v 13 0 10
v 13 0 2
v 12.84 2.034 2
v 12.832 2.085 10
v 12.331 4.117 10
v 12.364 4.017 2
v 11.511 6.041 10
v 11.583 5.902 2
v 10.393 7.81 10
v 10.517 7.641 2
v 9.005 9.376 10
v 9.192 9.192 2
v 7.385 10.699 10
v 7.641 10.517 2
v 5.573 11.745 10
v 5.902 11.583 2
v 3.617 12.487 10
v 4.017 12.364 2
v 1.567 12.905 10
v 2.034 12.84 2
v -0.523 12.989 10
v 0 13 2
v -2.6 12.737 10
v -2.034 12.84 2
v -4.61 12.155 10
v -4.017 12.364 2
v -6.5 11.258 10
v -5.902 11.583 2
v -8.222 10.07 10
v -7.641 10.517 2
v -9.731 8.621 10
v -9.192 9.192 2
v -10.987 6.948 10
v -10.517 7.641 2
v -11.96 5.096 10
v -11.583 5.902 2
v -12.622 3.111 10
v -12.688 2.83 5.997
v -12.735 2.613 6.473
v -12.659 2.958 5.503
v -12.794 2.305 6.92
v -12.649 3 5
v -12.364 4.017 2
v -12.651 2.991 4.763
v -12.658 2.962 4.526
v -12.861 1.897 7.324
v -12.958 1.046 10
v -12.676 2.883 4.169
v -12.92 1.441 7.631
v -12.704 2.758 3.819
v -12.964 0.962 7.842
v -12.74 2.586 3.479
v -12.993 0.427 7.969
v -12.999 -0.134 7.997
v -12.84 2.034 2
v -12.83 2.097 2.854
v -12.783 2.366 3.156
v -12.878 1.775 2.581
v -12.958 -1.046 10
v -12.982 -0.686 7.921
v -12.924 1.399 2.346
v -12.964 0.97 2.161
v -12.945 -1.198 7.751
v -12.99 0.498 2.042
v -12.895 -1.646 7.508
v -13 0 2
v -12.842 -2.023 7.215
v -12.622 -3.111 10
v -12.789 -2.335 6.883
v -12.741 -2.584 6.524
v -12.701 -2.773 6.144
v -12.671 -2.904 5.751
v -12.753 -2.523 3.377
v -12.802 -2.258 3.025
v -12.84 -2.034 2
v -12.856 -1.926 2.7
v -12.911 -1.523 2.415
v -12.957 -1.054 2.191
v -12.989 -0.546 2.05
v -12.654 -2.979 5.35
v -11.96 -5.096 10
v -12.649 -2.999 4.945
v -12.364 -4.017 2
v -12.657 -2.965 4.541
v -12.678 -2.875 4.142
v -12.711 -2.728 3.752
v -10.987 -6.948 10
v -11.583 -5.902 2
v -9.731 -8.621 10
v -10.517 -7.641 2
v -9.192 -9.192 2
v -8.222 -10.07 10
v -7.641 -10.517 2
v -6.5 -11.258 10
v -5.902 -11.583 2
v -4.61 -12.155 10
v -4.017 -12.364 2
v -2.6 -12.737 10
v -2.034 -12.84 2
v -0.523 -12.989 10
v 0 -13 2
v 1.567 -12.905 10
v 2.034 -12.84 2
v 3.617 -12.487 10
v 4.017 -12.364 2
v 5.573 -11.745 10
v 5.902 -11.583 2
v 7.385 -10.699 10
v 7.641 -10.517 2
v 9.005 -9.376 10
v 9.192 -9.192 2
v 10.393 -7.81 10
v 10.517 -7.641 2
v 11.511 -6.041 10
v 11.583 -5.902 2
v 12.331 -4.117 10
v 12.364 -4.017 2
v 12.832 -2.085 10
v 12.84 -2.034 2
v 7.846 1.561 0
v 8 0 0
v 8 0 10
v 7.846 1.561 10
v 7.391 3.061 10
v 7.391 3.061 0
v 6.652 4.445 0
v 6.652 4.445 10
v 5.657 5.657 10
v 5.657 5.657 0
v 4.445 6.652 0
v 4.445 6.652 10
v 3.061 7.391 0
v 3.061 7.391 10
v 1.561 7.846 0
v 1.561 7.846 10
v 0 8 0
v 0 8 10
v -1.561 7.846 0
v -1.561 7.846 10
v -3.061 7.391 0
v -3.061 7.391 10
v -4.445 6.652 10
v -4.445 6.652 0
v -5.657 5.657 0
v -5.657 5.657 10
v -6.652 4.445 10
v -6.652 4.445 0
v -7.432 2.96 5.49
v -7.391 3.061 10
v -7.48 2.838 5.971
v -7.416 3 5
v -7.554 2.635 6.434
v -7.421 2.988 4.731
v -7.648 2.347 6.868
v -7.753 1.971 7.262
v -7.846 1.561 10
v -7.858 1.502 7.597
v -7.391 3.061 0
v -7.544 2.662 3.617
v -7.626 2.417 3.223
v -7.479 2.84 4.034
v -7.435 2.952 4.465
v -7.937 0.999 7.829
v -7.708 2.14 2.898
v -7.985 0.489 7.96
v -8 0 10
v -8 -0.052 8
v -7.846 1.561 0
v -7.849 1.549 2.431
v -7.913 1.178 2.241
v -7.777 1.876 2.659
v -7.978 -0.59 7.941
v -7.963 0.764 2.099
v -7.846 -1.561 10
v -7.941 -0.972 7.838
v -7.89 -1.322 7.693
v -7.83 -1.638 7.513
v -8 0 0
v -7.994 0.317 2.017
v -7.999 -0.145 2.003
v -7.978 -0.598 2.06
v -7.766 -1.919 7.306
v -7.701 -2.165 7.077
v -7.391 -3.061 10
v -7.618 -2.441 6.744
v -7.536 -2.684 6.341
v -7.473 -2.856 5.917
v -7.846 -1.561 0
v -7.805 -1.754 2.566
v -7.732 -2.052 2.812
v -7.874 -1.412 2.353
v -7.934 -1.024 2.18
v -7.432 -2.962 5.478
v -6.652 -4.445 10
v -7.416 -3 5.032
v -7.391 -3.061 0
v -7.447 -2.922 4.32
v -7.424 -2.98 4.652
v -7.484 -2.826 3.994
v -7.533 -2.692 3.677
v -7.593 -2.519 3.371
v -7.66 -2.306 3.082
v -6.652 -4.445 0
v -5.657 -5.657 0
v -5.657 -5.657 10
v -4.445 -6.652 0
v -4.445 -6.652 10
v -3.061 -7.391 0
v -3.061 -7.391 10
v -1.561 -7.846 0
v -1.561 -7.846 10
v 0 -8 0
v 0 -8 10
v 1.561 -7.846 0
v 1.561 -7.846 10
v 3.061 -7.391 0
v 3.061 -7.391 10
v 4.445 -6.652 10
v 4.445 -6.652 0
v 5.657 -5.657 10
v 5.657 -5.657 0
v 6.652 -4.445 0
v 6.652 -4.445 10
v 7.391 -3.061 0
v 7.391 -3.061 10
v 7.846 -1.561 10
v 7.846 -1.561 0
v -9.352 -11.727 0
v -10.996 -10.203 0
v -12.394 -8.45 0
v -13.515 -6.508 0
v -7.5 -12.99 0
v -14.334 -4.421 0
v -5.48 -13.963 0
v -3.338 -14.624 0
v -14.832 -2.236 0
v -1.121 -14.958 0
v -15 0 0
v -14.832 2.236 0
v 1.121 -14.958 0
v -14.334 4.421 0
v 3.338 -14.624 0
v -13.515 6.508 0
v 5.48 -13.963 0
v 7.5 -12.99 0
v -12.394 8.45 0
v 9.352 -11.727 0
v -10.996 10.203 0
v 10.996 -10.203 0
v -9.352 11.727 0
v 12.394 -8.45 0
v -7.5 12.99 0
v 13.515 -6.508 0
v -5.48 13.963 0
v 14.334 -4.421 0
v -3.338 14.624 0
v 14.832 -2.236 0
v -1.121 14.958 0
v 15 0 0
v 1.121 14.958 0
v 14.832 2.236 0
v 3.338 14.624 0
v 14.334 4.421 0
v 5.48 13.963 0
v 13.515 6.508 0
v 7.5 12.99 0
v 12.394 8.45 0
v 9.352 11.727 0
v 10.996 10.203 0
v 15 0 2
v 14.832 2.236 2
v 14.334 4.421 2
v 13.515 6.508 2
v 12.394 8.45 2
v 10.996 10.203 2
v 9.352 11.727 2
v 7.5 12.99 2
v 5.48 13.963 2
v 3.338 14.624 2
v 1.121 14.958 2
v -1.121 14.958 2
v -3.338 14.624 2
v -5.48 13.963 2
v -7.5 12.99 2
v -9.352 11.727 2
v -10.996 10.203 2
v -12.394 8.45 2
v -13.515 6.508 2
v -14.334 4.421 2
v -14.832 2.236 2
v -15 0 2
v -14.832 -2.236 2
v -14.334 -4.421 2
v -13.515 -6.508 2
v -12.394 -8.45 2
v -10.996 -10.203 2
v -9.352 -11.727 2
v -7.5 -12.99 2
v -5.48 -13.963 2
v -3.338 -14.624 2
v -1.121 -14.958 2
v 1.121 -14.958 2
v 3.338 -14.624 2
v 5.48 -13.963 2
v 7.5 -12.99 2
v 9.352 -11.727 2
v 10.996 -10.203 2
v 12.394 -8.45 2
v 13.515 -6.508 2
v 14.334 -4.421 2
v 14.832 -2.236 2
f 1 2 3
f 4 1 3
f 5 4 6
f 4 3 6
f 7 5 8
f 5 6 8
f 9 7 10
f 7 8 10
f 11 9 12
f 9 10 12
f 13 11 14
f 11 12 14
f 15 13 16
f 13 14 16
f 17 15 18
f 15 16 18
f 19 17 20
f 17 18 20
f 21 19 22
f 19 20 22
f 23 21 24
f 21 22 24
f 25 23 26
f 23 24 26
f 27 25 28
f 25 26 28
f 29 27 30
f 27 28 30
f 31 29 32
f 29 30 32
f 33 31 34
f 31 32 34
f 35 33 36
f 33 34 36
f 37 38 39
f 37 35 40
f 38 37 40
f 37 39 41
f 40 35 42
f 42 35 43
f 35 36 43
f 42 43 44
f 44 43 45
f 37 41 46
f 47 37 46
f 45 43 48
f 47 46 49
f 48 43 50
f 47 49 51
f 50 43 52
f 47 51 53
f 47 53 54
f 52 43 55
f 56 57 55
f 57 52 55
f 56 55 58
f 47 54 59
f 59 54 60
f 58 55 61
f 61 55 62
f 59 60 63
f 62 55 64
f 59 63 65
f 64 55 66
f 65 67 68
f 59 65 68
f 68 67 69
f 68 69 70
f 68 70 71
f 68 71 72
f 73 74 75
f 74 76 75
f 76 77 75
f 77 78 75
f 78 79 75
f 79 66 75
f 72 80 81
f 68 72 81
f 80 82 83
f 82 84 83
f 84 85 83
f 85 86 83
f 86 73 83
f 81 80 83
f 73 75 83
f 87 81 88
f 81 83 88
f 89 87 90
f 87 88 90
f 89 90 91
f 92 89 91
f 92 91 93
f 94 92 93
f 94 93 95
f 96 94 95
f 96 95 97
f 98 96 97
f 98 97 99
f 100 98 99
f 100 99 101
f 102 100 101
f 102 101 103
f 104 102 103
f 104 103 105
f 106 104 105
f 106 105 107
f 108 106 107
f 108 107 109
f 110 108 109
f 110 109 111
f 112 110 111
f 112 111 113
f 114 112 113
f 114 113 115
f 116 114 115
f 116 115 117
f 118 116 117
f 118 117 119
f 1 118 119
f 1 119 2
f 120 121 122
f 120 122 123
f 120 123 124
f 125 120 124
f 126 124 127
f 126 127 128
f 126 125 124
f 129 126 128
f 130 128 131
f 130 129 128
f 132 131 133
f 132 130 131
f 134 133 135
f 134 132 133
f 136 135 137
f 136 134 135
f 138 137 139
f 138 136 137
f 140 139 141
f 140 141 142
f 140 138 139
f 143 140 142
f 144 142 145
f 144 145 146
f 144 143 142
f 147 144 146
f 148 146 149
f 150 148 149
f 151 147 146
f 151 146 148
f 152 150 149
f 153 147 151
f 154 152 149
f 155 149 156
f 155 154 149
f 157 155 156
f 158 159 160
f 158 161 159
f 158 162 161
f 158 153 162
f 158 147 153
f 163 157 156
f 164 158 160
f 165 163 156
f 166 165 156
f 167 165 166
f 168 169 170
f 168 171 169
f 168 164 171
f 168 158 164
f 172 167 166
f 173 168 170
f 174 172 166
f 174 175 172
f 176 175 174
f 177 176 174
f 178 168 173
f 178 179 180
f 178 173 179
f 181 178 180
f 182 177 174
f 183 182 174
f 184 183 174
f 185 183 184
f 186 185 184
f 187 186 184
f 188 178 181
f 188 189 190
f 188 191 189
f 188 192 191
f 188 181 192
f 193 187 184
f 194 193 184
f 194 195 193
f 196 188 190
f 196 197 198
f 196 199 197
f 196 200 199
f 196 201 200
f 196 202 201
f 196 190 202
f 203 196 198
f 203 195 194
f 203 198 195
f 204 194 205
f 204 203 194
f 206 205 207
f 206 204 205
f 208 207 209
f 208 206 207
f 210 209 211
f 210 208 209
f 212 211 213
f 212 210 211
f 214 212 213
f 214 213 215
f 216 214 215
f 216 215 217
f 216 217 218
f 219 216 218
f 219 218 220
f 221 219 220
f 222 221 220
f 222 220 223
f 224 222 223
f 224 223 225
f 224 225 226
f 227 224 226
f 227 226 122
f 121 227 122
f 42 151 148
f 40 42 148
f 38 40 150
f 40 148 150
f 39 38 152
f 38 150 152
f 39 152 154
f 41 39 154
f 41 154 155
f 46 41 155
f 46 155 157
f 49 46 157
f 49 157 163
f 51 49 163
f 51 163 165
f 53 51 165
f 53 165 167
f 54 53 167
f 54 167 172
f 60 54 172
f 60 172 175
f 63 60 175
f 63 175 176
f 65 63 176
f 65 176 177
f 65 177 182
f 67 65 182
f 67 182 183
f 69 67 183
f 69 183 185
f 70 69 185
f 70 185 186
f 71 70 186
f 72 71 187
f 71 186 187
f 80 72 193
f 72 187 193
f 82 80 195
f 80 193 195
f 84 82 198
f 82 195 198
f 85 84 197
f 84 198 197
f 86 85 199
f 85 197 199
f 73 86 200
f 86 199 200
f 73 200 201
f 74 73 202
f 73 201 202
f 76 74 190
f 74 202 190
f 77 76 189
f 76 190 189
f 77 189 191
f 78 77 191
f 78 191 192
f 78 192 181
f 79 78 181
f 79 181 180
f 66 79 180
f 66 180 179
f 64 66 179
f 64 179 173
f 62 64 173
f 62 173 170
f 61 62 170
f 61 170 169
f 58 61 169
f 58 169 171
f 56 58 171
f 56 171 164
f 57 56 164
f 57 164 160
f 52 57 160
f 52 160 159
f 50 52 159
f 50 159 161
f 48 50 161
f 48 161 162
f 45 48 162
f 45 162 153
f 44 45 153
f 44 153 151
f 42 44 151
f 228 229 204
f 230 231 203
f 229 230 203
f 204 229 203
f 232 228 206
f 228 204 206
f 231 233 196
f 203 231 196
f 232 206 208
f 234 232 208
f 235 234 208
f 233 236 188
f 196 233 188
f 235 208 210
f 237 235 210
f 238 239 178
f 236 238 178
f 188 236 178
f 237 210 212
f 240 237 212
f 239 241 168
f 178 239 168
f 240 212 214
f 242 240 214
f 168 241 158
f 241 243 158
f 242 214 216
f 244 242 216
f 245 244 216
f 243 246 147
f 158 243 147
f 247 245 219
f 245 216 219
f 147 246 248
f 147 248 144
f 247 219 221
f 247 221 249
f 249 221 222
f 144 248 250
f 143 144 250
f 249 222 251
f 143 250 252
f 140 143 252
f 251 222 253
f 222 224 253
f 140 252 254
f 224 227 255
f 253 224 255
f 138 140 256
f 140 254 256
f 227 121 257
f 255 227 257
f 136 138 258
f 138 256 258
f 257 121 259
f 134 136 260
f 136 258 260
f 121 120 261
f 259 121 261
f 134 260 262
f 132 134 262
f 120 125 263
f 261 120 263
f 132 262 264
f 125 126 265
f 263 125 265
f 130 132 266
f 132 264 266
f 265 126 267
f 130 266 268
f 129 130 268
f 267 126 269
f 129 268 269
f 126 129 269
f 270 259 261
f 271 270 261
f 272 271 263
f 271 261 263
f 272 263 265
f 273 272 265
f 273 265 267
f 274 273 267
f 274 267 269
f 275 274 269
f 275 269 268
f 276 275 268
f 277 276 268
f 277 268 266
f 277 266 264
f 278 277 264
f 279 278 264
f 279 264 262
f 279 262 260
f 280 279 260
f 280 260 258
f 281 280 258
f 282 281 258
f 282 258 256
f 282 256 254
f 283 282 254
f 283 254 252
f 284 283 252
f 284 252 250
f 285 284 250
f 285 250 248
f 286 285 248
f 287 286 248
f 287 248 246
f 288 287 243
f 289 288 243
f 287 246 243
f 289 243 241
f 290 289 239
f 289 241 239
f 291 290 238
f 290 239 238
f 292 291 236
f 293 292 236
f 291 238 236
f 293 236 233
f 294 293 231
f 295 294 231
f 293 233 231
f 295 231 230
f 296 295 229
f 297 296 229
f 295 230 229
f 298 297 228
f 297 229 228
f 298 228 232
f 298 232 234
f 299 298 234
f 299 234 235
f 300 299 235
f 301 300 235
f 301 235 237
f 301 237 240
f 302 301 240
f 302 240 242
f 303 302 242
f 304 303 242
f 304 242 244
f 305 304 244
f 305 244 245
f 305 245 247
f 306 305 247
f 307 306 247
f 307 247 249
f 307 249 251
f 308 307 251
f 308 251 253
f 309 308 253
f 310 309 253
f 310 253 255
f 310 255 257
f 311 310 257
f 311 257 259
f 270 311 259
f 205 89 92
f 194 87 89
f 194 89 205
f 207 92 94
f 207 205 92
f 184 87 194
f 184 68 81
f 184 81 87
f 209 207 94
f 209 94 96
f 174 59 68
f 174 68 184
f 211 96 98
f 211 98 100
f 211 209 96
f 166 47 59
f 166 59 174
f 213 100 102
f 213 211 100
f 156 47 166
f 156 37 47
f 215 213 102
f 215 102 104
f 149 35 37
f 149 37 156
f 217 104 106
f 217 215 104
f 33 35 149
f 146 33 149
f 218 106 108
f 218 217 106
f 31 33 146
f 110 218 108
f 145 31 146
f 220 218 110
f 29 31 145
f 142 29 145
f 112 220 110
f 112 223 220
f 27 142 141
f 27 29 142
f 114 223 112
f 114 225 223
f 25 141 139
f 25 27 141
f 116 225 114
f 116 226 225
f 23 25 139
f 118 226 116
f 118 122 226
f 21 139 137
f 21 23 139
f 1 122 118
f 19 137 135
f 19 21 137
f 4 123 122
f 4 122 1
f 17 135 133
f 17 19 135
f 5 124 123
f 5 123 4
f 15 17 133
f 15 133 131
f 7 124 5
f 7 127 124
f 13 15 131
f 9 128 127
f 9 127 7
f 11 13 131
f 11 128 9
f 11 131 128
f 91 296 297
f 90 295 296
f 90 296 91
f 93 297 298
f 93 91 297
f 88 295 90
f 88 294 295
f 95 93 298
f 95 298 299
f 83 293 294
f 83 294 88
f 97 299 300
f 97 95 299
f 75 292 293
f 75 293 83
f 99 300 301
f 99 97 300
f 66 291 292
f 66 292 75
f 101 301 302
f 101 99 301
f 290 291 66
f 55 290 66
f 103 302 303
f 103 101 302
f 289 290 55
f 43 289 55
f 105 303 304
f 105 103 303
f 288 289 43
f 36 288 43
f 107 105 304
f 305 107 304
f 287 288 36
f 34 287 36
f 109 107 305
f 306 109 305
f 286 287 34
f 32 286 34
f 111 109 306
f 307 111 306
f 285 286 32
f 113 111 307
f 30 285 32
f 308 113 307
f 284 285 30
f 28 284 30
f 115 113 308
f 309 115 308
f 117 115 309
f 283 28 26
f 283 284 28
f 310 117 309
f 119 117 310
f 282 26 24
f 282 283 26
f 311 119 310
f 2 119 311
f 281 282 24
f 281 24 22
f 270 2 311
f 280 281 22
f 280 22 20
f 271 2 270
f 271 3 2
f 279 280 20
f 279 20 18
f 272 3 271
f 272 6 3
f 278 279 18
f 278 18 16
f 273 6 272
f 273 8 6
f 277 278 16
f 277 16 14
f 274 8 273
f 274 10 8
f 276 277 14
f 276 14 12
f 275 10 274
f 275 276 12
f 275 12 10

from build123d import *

# Parameters (mm, degrees)
F0_R     = 15
F0_R_2   = 8
F1_DEPTH = 2
F2_R     = 13
F2_R_2   = 8
F3_DEPTH = 8
F5_D     = 6
F5_DEPTH = 25
F5_TIP   = 1.8025818571


with BuildPart() as f1:
    # F0 (on Top) → F1 (new body)
    with BuildSketch(Plane.XY):
        Circle(F0_R)
        Circle(F0_R_2, mode=Mode.SUBTRACT)
    extrude(amount=F1_DEPTH)

    # F2 (on face) → F3 (join)
    with BuildSketch(Plane.XY.offset(2)):
        Circle(F2_R)
        Circle(F2_R_2, mode=Mode.SUBTRACT)
    extrude(amount=F3_DEPTH)

    # F5 (one way)
    with BuildSketch(Plane.YZ):
        with Locations((0, 5)):
            Circle(F5_D / 2)
    extrude(amount=-F5_DEPTH, mode=Mode.SUBTRACT)
    with Locations(Plane.YZ):
        with Locations((0, 5)):
            with Locations((0, 0, -(F5_DEPTH + F5_TIP / 2))):  # 118° drill point
                Cone(0, F5_D / 2, F5_TIP, mode=Mode.SUBTRACT)


solid = f1.part
